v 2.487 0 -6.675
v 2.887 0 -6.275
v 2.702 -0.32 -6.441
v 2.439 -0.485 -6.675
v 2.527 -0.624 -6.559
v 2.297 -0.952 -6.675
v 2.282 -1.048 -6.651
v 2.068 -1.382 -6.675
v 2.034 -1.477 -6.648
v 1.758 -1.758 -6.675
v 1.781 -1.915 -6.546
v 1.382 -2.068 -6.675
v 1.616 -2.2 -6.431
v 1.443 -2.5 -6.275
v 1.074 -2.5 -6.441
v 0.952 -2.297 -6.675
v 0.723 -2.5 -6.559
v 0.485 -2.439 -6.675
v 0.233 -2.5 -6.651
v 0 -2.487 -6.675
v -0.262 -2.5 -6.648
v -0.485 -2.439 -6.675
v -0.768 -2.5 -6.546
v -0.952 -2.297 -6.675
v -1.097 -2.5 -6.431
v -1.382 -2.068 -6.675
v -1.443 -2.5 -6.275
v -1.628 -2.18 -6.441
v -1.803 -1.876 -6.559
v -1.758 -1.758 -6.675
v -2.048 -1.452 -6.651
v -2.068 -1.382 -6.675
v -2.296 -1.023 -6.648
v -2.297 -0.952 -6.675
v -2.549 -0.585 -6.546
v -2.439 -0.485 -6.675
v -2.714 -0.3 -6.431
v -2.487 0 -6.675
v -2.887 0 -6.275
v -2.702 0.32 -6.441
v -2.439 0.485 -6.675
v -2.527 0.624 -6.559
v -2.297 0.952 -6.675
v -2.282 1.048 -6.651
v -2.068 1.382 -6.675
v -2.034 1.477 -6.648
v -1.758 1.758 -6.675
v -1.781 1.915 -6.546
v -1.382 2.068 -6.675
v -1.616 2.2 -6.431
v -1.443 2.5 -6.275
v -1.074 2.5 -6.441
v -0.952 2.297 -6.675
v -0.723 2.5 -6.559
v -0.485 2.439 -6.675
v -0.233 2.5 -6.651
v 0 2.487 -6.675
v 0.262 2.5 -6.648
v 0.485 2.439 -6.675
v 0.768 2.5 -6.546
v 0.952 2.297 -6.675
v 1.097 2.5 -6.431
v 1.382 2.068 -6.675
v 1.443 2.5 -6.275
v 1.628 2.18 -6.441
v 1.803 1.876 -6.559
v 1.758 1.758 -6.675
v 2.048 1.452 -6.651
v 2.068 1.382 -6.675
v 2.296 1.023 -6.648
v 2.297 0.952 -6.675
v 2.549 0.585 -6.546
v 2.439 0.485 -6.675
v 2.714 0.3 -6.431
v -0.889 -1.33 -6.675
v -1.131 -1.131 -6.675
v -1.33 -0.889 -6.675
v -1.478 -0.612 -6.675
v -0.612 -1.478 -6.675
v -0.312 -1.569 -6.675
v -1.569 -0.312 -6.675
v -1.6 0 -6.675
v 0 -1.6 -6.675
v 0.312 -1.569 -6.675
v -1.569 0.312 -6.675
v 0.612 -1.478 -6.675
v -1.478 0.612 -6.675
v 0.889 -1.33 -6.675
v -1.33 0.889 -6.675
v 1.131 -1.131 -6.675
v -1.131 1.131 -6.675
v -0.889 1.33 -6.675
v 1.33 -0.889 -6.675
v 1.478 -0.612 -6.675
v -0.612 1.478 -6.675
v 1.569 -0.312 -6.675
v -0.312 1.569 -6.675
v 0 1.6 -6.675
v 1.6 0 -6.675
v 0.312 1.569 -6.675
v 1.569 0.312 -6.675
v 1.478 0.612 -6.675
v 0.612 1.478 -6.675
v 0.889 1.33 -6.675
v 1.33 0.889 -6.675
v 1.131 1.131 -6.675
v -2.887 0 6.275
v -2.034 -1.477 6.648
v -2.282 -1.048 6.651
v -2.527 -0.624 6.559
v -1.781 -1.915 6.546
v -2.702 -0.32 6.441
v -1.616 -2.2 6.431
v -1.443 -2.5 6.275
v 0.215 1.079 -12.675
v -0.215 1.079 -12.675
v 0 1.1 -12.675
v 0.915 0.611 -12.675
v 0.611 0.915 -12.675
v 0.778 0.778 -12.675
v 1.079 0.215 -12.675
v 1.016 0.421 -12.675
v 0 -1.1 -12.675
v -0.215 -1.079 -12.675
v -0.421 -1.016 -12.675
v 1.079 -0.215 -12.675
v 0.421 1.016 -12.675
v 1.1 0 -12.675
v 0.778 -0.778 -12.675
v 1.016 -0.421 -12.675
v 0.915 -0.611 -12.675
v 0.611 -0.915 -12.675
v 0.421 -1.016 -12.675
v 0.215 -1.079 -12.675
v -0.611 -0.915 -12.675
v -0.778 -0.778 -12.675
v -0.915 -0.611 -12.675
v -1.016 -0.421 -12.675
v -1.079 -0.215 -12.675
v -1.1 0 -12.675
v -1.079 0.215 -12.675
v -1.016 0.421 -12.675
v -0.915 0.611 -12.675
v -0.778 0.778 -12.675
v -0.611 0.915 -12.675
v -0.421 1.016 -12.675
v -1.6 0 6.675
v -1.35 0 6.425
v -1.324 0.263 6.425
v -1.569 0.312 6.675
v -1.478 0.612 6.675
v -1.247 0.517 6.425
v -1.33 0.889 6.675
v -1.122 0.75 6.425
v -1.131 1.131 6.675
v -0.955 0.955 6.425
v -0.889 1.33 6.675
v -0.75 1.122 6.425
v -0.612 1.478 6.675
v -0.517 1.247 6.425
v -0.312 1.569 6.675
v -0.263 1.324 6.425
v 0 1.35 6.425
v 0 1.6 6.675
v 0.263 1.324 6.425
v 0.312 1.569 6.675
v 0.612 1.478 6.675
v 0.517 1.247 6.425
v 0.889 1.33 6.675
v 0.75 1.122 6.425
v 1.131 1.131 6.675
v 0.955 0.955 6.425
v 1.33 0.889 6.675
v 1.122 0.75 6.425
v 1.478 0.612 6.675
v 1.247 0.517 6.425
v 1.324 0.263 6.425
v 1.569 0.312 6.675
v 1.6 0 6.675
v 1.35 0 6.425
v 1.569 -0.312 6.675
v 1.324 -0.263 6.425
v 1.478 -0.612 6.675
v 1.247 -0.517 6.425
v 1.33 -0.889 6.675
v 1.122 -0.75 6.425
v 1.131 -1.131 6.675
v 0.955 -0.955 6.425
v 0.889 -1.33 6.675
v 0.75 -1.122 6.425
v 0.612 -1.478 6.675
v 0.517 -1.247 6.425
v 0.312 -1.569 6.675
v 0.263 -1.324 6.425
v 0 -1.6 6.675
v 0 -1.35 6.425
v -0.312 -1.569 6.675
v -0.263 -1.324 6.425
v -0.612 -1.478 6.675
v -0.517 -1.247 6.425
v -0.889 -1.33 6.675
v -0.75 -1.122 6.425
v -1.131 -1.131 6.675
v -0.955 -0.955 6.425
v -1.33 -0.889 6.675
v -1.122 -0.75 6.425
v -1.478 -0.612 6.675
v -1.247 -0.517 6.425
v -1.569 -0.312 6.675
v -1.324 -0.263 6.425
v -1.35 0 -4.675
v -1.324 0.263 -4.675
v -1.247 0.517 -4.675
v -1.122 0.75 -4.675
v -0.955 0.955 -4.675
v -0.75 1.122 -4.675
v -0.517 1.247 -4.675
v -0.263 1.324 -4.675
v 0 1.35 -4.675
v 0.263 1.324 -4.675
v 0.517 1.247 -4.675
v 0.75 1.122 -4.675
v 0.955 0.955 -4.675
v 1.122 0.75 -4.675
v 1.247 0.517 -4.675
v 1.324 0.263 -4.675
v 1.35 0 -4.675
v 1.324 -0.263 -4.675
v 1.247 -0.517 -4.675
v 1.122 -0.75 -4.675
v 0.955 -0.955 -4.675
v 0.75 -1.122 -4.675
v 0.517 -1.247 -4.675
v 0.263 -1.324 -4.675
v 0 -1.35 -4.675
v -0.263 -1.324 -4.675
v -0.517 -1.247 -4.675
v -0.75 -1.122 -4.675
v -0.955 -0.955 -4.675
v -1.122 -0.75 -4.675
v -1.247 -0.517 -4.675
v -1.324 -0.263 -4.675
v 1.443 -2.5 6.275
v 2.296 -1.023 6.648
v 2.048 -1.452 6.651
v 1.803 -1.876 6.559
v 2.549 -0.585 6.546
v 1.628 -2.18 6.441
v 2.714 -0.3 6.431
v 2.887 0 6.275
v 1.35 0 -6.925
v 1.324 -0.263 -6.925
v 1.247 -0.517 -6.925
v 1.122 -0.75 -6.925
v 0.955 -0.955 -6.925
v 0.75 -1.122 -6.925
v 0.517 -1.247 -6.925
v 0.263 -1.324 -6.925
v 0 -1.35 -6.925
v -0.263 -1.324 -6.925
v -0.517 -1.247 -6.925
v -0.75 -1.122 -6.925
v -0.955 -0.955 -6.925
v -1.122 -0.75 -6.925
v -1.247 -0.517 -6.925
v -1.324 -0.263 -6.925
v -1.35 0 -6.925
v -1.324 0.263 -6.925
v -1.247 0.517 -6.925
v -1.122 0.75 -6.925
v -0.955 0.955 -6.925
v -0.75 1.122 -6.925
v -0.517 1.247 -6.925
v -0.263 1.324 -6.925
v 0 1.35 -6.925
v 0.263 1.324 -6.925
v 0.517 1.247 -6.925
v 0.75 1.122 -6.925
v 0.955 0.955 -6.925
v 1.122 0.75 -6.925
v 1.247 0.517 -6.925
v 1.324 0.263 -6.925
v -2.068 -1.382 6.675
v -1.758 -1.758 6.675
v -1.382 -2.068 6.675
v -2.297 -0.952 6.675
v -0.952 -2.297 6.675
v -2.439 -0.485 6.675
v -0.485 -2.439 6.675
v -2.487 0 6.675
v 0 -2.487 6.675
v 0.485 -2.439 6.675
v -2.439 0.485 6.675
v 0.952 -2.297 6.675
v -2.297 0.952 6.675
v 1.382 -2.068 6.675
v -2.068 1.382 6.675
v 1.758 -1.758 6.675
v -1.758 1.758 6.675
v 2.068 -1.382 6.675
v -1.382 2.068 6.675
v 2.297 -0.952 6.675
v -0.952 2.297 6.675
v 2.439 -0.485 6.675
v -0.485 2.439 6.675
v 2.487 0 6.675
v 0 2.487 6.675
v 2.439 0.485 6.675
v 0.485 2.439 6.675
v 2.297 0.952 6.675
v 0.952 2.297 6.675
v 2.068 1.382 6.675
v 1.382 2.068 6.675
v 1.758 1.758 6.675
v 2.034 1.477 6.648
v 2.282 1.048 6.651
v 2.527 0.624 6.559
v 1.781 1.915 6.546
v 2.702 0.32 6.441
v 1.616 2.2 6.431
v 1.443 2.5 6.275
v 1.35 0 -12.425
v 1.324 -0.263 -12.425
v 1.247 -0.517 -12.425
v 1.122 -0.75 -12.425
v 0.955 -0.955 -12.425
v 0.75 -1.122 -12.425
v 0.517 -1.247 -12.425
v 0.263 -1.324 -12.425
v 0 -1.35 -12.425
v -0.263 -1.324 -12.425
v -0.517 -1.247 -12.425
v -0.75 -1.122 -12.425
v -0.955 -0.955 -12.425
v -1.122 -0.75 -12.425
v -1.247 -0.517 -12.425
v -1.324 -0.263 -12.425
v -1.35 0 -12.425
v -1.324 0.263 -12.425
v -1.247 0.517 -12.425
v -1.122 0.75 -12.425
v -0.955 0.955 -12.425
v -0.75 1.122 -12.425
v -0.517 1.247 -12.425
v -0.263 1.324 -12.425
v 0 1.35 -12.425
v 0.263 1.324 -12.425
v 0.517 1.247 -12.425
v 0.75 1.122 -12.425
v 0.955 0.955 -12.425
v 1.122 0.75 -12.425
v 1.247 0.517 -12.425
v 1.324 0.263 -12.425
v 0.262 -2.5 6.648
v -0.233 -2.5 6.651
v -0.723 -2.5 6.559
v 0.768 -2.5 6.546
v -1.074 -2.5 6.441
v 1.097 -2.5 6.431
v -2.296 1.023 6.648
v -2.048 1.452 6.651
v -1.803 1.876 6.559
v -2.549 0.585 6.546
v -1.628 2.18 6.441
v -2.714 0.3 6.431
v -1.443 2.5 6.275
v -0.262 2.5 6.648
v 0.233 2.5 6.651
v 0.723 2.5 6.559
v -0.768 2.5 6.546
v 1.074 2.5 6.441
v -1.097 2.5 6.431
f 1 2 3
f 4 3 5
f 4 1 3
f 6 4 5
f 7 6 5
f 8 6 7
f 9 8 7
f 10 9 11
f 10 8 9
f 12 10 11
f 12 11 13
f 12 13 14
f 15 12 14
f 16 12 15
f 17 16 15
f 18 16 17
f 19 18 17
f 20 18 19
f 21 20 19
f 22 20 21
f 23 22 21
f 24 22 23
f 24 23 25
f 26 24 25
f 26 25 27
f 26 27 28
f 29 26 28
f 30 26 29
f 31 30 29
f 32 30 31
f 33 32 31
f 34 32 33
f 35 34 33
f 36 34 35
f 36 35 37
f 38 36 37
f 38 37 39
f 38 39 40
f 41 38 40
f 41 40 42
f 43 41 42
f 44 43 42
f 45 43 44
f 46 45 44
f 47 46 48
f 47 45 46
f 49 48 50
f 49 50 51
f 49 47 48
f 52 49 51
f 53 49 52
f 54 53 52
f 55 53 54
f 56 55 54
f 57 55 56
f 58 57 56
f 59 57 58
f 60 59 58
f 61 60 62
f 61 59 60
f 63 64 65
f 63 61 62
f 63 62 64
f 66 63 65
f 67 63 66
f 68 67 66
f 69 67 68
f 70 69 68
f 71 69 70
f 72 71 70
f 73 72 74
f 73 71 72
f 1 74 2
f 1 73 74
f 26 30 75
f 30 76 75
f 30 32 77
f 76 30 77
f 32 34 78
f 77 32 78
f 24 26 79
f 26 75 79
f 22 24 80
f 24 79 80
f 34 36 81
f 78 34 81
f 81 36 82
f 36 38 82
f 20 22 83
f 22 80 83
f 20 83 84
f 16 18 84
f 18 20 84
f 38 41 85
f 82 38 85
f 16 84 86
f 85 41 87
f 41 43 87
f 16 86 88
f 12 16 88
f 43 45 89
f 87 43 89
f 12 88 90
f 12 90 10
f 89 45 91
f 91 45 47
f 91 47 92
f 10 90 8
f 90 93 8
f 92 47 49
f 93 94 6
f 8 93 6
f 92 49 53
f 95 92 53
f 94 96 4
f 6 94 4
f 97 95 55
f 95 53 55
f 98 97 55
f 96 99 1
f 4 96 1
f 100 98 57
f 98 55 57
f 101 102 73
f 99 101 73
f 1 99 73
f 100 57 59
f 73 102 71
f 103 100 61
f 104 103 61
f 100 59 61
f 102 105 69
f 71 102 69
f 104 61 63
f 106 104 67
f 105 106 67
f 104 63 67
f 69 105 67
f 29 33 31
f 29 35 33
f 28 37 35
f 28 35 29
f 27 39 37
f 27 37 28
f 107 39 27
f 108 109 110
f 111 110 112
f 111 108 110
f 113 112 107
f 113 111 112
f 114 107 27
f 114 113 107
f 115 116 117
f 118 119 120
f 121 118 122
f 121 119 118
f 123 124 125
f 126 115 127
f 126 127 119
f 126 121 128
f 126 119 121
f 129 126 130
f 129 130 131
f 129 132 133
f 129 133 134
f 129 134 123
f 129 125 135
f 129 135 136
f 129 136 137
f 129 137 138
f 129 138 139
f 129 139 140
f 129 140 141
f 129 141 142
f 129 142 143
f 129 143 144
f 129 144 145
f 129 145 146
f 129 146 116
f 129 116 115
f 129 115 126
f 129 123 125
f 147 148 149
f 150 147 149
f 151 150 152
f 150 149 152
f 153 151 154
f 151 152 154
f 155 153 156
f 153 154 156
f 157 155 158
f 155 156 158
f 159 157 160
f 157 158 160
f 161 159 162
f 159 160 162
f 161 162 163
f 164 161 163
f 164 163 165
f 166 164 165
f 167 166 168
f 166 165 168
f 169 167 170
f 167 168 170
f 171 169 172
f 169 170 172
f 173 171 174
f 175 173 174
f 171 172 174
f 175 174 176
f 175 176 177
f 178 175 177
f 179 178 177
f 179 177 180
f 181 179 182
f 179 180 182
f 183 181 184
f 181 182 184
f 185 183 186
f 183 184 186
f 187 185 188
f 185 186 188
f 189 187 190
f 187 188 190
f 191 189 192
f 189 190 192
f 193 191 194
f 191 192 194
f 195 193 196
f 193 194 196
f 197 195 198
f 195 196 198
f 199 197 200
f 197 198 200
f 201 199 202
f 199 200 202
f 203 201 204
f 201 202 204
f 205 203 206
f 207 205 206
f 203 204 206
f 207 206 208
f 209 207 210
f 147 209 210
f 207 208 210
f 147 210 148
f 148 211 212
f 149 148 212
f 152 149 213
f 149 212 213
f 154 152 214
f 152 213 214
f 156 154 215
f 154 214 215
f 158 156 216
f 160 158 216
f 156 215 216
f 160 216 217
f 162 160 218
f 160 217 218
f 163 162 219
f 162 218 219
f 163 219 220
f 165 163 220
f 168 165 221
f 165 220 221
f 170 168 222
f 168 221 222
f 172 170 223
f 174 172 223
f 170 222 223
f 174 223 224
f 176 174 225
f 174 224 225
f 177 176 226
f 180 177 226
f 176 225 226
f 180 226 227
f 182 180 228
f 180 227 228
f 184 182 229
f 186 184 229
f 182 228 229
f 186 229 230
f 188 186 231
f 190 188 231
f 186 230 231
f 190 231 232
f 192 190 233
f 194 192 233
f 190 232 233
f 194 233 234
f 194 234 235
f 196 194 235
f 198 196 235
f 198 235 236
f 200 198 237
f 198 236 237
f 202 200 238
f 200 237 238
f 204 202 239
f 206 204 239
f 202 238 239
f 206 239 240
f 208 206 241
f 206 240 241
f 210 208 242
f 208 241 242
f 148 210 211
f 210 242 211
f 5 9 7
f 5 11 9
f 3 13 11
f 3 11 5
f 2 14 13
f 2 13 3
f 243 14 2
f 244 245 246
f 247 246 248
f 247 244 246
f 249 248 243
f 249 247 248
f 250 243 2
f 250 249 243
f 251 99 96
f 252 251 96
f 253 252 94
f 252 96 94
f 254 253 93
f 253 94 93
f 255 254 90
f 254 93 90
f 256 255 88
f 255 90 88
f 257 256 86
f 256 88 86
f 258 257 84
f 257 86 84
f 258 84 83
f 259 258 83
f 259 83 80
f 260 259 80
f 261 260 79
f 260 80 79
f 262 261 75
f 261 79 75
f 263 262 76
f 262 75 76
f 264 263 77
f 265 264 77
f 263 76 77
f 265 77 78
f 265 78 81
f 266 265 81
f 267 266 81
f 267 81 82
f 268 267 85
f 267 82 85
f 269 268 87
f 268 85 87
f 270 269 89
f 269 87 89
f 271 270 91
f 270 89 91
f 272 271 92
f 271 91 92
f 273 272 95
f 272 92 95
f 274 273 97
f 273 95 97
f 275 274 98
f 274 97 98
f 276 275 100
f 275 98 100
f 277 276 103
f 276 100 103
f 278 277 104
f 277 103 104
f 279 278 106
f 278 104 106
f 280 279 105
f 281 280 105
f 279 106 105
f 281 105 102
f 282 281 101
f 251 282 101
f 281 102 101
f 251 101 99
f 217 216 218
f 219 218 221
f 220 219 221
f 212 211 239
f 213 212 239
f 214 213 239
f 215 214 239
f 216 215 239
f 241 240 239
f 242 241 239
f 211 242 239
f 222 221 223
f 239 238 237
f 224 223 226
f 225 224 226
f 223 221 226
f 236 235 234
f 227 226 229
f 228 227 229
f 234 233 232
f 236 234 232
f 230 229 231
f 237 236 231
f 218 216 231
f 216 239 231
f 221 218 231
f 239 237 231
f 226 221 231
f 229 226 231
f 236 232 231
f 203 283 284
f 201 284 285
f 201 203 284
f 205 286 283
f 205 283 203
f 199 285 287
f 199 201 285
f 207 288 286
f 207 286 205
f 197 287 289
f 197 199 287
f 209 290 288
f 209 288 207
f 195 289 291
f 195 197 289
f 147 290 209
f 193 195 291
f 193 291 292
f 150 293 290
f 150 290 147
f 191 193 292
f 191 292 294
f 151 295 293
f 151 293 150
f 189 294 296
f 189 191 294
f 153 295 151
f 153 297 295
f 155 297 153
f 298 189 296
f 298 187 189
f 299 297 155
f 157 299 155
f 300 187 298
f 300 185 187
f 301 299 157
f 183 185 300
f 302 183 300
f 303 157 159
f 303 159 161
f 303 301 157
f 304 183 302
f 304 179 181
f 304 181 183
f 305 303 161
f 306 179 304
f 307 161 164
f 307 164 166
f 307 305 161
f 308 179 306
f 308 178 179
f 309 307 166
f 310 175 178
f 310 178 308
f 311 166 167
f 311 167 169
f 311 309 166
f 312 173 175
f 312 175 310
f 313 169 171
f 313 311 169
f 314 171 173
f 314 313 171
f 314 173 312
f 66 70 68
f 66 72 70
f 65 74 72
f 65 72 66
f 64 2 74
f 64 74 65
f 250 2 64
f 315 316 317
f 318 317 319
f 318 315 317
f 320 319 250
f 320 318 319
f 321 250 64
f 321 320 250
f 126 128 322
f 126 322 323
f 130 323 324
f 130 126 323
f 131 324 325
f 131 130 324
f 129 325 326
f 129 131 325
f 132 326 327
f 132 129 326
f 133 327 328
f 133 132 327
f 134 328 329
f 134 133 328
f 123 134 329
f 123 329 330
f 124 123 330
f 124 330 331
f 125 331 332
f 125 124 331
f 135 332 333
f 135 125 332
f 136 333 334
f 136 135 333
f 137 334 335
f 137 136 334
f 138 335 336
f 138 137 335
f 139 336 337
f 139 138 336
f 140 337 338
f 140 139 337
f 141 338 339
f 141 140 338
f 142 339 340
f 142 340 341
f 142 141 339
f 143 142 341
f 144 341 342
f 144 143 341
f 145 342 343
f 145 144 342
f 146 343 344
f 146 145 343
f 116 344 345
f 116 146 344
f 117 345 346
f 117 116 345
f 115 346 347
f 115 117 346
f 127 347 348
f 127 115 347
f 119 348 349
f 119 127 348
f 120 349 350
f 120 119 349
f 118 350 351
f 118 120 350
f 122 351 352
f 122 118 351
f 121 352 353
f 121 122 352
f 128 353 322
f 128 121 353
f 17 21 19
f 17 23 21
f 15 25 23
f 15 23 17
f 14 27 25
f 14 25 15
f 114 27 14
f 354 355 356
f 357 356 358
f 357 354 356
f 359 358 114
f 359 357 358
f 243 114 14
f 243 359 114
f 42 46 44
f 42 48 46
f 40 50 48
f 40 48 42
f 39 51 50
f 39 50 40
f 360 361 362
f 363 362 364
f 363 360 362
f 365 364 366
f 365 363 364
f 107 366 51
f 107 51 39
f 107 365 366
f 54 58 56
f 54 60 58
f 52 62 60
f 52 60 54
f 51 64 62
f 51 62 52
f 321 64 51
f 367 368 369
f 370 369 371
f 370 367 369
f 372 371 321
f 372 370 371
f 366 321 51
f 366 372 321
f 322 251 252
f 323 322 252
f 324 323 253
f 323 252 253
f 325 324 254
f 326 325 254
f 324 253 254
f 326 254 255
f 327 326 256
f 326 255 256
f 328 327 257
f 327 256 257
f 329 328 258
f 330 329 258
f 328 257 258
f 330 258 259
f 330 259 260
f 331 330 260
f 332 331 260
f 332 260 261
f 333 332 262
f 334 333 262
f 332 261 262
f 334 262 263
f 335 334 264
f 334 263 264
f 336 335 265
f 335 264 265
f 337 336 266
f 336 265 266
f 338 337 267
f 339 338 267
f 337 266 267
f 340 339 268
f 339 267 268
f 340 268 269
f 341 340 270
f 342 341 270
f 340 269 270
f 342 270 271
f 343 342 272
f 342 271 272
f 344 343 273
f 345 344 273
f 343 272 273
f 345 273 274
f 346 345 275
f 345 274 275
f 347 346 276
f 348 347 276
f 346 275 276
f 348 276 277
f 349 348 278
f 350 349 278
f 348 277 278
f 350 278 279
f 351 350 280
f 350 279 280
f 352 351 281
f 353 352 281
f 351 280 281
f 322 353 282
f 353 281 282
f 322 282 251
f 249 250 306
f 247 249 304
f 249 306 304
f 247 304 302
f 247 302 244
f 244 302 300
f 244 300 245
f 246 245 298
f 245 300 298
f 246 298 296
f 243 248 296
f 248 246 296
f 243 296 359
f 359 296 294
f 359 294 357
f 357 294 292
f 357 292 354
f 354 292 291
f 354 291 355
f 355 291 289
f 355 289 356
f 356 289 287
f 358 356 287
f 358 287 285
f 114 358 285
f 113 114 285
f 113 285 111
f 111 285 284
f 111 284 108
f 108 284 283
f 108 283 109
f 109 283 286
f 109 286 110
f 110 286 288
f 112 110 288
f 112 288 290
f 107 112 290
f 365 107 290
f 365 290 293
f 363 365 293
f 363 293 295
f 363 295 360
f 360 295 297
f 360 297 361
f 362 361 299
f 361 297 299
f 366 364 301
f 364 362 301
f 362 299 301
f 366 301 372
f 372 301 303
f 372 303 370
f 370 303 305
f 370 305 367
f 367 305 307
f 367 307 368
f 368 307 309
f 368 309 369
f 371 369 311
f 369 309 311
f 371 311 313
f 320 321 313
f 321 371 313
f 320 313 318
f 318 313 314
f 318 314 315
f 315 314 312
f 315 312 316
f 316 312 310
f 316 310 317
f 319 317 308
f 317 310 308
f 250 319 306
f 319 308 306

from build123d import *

# Parameters (mm, degrees)
HEX_2_DEPTH                 = 6.675
TAP_DRILL_FOR_M3X0_5_TAP1_D = 2.7
THREAD_DEPTH                = 6
THREAD_DEPTH_BACK           = 2
SKETCH8_R                   = 1.35
INNERCHAMFER_SIZE           = 0.25


with BuildPart() as part:
    # Sketch1 → HEX 2 (new, symmetric)
    with BuildSketch(Plane.XY):
        Polygon((2.886751346, 0), (1.443375673, 2.5), (-1.443375673, 2.5), (-2.886751346, 0), (-1.443375673, -2.5), (1.443375673, -2.5), align=None)
    extrude(amount=HEX_2_DEPTH, both=True)

    # Tap Drill for M3x0.5 Tap1 (through all)
    with Locations(Plane.XY.offset(6.675)):
        with Locations((0, 0)):
            Hole(TAP_DRILL_FOR_M3X0_5_TAP1_D / 2)

    # Sketch7 → HexChamfer (revolve, cut)
    with BuildSketch(Plane(origin=(0, 0, 0), x_dir=(1, 0, 0), z_dir=(0, 1, 0)), mode=Mode.PRIVATE) as hexchamfer_sk:
        Polygon((-2.886751346, 6.675), (-2.886751346, 6.275), (-2.486751346, 6.675), align=None)
    hexchamfer = revolve(hexchamfer_sk.sketch.rotate(Axis((0, 0, 15.266742202), (0, 0, -1)), 180), axis=Axis((0, 0, 15.266742202), (0, 0, -1)), mode=Mode.SUBTRACT)

    # Mirror1: HexChamfer across plane
    add(hexchamfer.mirror(Plane.XY), mode=Mode.SUBTRACT)

    # Sketch8 → Thread (add, two sides: drawn at the far end of the back side and taken through both)
    with BuildSketch(Plane(origin=(0, 0, -6.675), x_dir=(-1, 0, 0), z_dir=(0, 0, -1)).offset(-THREAD_DEPTH_BACK)):
        with Locations(Location((0, 0, 0), (0, 0, 180))):
            Circle(SKETCH8_R)
    extrude(amount=THREAD_DEPTH + THREAD_DEPTH_BACK)

    # InnerChamfer
    innerchamfer_edges = [part.edges().sort_by_distance(p)[0] for p in [
        (1.35, 0, 6.675),
        (-1.35, 0, -6.675),
        (-1.35, 0, -12.675),
    ]]
    chamfer(innerchamfer_edges, length=INNERCHAMFER_SIZE)


solid = part.part
